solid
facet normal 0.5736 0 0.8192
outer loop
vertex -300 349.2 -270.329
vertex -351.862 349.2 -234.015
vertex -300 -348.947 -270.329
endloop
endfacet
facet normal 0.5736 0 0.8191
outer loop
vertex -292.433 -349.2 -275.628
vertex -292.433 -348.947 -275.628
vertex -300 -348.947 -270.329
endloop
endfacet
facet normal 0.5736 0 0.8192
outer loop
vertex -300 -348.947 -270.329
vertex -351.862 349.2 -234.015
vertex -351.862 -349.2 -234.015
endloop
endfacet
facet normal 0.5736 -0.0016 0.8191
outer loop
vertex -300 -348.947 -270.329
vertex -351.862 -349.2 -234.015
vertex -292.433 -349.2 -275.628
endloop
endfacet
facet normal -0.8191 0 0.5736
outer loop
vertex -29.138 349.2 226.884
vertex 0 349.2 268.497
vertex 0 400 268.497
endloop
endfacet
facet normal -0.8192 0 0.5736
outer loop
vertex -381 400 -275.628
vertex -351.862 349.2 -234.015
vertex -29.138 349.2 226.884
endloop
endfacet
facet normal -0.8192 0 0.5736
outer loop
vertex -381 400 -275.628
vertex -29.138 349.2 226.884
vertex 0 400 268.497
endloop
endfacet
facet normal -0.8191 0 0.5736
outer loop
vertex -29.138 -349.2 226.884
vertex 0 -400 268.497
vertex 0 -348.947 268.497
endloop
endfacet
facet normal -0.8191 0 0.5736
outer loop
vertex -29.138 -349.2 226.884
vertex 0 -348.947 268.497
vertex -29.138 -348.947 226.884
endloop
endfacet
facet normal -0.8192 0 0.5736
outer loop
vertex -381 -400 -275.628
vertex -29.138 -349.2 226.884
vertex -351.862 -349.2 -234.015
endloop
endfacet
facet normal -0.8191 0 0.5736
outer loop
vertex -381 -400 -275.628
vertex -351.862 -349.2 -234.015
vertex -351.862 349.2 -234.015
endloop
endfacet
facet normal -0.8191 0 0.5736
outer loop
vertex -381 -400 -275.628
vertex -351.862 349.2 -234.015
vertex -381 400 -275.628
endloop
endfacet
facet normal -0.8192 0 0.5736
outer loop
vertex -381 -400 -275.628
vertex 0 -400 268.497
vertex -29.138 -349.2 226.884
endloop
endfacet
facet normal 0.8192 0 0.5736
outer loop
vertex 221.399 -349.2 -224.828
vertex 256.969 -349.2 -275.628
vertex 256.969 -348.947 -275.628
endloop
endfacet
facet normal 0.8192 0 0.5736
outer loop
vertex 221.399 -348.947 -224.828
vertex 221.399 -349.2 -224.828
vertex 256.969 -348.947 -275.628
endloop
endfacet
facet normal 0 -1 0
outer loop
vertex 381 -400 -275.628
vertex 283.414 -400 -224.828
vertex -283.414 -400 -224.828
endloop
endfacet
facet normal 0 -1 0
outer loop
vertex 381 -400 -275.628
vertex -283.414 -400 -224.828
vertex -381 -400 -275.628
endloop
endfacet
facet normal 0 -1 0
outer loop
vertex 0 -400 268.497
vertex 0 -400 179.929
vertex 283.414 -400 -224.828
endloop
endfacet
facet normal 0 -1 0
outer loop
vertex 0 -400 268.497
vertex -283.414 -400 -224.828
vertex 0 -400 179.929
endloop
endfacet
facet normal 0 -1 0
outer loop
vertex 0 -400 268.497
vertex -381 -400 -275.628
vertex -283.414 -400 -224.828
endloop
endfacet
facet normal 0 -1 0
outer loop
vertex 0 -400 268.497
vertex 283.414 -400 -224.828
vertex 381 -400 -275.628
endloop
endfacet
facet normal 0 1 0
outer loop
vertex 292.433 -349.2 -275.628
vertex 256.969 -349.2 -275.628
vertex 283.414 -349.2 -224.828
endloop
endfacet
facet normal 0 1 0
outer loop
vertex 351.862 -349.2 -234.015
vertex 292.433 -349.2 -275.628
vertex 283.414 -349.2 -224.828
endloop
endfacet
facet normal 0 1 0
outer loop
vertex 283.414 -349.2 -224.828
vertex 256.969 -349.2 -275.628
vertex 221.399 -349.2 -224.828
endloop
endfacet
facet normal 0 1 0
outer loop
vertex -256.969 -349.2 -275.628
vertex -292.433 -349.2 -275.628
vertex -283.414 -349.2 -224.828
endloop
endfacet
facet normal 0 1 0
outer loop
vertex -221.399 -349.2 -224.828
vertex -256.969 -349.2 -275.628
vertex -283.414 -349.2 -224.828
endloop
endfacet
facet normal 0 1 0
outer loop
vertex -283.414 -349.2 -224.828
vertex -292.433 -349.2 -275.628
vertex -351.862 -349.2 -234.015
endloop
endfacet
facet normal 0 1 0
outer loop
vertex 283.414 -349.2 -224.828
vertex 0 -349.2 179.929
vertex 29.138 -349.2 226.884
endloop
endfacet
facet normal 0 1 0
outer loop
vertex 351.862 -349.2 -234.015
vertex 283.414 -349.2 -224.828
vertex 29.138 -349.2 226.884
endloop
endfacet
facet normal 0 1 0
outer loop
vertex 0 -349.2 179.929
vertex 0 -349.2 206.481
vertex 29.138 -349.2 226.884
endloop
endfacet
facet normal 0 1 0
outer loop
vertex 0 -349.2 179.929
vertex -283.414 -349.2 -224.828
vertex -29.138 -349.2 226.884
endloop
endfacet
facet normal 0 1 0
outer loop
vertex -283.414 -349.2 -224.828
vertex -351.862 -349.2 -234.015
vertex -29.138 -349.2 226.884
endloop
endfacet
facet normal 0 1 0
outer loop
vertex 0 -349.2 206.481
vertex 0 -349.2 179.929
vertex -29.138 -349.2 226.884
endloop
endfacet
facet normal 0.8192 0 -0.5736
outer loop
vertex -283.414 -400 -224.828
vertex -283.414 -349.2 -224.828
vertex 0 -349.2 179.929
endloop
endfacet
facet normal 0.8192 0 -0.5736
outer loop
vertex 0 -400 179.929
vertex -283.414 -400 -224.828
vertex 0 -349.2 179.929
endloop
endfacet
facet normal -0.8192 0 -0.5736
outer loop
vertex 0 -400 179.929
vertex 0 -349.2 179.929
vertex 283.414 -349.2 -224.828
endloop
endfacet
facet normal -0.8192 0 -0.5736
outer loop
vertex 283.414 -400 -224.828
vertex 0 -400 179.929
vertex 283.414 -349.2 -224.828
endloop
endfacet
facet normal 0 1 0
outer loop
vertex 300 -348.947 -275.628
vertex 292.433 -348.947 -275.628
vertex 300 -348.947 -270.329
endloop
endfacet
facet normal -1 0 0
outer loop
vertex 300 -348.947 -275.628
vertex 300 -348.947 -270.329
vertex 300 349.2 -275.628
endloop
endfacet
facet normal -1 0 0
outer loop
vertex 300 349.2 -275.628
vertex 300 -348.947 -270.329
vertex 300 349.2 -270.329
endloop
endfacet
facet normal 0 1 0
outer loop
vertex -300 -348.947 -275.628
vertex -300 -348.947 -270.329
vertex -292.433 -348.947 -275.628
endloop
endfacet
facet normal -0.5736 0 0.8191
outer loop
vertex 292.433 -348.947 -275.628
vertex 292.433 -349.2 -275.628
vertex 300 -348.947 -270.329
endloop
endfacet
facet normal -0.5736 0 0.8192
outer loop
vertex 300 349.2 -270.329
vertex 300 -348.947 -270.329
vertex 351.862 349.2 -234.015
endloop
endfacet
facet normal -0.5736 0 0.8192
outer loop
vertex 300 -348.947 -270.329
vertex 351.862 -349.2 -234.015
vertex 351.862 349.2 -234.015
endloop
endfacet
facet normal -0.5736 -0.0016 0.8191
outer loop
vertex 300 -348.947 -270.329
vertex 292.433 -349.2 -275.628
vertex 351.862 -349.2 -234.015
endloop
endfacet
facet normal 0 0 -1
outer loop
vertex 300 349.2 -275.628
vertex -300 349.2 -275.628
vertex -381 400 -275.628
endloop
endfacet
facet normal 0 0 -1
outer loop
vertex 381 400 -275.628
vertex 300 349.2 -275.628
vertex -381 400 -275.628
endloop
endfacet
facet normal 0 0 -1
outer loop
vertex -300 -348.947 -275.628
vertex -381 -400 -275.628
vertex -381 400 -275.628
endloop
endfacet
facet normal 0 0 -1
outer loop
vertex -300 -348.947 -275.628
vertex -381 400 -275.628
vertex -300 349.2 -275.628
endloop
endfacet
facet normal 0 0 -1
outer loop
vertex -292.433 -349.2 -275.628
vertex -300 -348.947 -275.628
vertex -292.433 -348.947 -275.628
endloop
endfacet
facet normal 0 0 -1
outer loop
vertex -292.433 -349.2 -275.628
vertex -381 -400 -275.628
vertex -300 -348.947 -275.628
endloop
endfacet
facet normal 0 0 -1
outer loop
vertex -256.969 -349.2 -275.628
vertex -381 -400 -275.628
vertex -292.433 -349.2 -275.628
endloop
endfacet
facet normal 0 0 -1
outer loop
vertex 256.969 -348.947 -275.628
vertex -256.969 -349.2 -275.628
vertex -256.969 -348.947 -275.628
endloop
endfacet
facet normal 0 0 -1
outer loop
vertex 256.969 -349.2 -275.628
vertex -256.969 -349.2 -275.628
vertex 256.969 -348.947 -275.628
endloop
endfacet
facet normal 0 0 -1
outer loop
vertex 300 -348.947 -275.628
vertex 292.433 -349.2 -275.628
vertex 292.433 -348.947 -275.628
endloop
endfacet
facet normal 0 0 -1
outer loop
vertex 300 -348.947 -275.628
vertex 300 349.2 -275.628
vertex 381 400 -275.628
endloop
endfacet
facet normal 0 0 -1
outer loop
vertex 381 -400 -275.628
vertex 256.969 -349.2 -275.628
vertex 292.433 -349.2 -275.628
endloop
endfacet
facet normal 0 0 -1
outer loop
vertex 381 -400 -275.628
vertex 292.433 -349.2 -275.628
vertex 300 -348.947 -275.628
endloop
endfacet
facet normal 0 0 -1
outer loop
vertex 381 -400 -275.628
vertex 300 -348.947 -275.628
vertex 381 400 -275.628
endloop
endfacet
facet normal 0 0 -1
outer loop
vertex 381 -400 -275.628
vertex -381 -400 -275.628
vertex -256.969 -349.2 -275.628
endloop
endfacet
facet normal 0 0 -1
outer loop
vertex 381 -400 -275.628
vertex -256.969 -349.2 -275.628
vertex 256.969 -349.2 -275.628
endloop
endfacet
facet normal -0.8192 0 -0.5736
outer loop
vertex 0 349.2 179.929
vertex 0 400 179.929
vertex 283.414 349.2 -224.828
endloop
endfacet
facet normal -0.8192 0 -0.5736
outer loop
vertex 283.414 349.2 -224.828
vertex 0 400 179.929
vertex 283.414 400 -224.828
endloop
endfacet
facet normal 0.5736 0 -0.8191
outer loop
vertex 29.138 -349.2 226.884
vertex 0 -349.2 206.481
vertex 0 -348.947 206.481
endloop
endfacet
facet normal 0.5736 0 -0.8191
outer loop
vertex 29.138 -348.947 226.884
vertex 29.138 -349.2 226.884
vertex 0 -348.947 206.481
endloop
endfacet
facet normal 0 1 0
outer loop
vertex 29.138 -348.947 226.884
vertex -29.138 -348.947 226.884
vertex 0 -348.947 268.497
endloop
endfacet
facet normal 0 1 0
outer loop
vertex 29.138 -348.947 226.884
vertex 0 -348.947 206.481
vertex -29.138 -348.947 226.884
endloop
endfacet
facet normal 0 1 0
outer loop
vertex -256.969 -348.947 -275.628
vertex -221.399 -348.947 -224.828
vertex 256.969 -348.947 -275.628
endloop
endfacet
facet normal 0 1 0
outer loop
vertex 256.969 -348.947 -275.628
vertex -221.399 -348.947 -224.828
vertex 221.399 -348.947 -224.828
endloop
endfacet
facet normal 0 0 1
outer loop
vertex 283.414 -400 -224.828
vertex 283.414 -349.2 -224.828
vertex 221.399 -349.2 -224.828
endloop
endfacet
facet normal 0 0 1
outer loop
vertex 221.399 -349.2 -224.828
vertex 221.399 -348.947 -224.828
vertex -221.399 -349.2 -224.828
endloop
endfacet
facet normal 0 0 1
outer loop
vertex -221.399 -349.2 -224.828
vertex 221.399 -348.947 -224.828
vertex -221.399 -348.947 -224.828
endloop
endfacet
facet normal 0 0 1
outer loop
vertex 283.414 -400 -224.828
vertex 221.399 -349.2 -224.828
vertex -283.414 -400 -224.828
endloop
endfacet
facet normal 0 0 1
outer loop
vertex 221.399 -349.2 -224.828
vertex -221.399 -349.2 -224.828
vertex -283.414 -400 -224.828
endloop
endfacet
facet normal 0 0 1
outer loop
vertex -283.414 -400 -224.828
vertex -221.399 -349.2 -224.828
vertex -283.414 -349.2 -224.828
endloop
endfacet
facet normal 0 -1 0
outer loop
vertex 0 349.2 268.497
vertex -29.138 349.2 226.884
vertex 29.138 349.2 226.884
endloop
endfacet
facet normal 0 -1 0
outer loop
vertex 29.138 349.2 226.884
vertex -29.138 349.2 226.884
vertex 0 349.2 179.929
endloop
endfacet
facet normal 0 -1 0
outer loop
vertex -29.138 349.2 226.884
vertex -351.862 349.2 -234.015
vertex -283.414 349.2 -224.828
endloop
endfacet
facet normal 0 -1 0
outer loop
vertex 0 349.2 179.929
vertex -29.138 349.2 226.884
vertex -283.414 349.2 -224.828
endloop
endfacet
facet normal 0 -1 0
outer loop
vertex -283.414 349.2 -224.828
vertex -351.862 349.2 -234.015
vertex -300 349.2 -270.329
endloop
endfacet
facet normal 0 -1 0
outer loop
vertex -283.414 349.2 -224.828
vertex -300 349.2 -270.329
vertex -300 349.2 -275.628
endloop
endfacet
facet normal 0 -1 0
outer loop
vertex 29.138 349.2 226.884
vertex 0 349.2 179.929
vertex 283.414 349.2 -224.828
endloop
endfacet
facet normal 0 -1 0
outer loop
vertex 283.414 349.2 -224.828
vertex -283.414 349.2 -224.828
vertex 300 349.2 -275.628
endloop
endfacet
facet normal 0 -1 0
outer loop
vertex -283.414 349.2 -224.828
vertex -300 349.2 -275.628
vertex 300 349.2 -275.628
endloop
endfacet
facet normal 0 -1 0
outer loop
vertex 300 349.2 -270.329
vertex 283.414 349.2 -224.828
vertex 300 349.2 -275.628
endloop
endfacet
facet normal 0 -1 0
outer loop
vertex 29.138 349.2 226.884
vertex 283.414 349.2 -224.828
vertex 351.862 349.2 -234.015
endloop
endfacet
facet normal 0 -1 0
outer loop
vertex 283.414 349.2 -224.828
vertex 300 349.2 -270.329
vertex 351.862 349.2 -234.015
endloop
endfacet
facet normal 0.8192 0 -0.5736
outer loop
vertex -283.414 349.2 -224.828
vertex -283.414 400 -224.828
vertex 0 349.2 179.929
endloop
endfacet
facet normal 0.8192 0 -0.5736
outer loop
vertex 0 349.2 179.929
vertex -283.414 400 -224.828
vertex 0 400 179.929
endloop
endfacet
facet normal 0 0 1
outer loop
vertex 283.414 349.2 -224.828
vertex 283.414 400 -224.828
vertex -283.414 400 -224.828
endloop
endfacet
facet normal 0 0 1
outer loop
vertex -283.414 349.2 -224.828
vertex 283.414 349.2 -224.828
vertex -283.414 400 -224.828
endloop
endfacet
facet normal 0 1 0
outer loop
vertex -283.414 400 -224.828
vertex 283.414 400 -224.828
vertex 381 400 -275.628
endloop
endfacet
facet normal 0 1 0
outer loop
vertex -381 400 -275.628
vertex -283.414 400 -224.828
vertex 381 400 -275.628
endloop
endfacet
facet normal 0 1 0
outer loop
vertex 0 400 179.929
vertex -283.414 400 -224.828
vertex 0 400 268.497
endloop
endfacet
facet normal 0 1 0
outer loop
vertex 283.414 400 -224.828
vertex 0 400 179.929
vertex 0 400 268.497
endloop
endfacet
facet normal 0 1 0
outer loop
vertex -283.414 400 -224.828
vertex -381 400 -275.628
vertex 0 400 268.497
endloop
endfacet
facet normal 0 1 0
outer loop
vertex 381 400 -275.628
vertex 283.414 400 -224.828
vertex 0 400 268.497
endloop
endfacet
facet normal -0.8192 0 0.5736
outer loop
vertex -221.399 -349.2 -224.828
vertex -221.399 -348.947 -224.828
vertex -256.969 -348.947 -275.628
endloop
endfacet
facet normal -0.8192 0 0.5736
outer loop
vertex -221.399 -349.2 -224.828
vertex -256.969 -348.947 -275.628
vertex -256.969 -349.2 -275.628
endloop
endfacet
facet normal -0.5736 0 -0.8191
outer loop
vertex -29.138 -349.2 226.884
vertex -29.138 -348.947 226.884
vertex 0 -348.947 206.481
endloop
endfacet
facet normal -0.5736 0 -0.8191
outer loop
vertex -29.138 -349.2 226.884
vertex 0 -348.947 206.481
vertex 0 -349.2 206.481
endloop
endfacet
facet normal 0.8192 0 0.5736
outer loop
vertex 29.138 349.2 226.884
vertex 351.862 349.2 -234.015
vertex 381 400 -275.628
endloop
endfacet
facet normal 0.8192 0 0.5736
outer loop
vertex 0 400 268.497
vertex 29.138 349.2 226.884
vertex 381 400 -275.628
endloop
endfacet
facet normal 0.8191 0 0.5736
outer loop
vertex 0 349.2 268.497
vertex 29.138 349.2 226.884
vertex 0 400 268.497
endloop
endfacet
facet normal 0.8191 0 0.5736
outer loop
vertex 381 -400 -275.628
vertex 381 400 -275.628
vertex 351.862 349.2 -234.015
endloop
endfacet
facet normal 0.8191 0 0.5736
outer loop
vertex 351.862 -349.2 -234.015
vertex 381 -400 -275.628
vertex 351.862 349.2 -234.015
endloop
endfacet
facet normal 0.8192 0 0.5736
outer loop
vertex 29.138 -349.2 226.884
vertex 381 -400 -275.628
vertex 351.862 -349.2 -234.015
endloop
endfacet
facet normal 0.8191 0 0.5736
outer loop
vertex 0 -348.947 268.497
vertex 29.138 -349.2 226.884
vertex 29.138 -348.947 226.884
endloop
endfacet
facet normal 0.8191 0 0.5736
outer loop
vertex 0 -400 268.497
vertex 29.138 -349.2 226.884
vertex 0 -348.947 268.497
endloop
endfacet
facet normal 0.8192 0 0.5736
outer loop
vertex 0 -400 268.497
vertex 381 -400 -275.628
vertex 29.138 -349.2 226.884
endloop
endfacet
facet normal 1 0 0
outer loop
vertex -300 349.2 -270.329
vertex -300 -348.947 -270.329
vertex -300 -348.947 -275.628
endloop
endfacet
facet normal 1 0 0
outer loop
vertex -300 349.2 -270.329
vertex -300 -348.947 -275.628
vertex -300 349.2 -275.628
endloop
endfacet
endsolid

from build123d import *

# Parameters (mm, degrees)
F1_DEPTH  = 400
F2_W      = 698.4
F2_H      = 562.6532291316
F3_DEPTH  = 101.6
F4_W      = 698.4
F4_H      = 562.6532291316
F5_DEPTH  = 101.6
F7_DEPTH  = 800.001
F8_W      = 599.9999940395
F8_H      = 698.1473760128
F9_DEPTH  = 584.2
F10_DEPTH = 101.6


with BuildPart() as f1:
    # F0 (on Front) → F1 (new body, symmetric)
    with BuildSketch(Plane.XZ):
        Polygon((0, 268.4965017427), (-381, -275.6278888261), (381, -275.6278888261), align=None)
    extrude(amount=F1_DEPTH, both=True)

    # F2 (on face) → F3 (cut)
    with BuildSketch(Plane(origin=(126.1520906972, 0, 88.3326448671), x_dir=(0, 1, 0), z_dir=(0.8191520443, 0, 0.5735764364))):
        with Locations((0, -112.1871562789)):
            Rectangle(F2_W, F2_H)
    extrude(amount=-F3_DEPTH, mode=Mode.SUBTRACT)

    # F4 (on face) → F5 (cut)
    with BuildSketch(Plane(origin=(-126.1520906972, 0, 88.3326448671), x_dir=(0, -1, 0), z_dir=(-0.8191520443, 0, 0.5735764364))):
        with Locations((0, -112.1871562789)):
            Rectangle(F4_W, F4_H)
    extrude(amount=-F5_DEPTH, mode=Mode.SUBTRACT)

    # F6 (on face) → F7 (cut, through all)
    with BuildSketch(Plane(origin=(0, 400, 0), x_dir=(-1, 0, 0), z_dir=(0, 1, 0))):
        Polygon((0, 179.9294045251), (-283.4141079499, -224.8278888261), (283.4141079499, -224.8278888261), align=None)
    extrude(amount=-F7_DEPTH, mode=Mode.SUBTRACT)

    # F8 (on face) → F9 (cut)
    with BuildSketch(Plane.XY.offset(-224.8278888261)):
        with Locations((-1.49012e-05, 0.1263119936)):
            Rectangle(F8_W, F8_H)
    extrude(amount=F9_DEPTH, mode=Mode.SUBTRACT)

    # F8 (on face) → F10 (cut)
    with BuildSketch(Plane.XY.offset(-224.8278888261)):
        with Locations((-1.49012e-05, 0.1263119936)):
            Rectangle(F8_W, F8_H)
    extrude(amount=-F10_DEPTH, mode=Mode.SUBTRACT)


solid = f1.part
